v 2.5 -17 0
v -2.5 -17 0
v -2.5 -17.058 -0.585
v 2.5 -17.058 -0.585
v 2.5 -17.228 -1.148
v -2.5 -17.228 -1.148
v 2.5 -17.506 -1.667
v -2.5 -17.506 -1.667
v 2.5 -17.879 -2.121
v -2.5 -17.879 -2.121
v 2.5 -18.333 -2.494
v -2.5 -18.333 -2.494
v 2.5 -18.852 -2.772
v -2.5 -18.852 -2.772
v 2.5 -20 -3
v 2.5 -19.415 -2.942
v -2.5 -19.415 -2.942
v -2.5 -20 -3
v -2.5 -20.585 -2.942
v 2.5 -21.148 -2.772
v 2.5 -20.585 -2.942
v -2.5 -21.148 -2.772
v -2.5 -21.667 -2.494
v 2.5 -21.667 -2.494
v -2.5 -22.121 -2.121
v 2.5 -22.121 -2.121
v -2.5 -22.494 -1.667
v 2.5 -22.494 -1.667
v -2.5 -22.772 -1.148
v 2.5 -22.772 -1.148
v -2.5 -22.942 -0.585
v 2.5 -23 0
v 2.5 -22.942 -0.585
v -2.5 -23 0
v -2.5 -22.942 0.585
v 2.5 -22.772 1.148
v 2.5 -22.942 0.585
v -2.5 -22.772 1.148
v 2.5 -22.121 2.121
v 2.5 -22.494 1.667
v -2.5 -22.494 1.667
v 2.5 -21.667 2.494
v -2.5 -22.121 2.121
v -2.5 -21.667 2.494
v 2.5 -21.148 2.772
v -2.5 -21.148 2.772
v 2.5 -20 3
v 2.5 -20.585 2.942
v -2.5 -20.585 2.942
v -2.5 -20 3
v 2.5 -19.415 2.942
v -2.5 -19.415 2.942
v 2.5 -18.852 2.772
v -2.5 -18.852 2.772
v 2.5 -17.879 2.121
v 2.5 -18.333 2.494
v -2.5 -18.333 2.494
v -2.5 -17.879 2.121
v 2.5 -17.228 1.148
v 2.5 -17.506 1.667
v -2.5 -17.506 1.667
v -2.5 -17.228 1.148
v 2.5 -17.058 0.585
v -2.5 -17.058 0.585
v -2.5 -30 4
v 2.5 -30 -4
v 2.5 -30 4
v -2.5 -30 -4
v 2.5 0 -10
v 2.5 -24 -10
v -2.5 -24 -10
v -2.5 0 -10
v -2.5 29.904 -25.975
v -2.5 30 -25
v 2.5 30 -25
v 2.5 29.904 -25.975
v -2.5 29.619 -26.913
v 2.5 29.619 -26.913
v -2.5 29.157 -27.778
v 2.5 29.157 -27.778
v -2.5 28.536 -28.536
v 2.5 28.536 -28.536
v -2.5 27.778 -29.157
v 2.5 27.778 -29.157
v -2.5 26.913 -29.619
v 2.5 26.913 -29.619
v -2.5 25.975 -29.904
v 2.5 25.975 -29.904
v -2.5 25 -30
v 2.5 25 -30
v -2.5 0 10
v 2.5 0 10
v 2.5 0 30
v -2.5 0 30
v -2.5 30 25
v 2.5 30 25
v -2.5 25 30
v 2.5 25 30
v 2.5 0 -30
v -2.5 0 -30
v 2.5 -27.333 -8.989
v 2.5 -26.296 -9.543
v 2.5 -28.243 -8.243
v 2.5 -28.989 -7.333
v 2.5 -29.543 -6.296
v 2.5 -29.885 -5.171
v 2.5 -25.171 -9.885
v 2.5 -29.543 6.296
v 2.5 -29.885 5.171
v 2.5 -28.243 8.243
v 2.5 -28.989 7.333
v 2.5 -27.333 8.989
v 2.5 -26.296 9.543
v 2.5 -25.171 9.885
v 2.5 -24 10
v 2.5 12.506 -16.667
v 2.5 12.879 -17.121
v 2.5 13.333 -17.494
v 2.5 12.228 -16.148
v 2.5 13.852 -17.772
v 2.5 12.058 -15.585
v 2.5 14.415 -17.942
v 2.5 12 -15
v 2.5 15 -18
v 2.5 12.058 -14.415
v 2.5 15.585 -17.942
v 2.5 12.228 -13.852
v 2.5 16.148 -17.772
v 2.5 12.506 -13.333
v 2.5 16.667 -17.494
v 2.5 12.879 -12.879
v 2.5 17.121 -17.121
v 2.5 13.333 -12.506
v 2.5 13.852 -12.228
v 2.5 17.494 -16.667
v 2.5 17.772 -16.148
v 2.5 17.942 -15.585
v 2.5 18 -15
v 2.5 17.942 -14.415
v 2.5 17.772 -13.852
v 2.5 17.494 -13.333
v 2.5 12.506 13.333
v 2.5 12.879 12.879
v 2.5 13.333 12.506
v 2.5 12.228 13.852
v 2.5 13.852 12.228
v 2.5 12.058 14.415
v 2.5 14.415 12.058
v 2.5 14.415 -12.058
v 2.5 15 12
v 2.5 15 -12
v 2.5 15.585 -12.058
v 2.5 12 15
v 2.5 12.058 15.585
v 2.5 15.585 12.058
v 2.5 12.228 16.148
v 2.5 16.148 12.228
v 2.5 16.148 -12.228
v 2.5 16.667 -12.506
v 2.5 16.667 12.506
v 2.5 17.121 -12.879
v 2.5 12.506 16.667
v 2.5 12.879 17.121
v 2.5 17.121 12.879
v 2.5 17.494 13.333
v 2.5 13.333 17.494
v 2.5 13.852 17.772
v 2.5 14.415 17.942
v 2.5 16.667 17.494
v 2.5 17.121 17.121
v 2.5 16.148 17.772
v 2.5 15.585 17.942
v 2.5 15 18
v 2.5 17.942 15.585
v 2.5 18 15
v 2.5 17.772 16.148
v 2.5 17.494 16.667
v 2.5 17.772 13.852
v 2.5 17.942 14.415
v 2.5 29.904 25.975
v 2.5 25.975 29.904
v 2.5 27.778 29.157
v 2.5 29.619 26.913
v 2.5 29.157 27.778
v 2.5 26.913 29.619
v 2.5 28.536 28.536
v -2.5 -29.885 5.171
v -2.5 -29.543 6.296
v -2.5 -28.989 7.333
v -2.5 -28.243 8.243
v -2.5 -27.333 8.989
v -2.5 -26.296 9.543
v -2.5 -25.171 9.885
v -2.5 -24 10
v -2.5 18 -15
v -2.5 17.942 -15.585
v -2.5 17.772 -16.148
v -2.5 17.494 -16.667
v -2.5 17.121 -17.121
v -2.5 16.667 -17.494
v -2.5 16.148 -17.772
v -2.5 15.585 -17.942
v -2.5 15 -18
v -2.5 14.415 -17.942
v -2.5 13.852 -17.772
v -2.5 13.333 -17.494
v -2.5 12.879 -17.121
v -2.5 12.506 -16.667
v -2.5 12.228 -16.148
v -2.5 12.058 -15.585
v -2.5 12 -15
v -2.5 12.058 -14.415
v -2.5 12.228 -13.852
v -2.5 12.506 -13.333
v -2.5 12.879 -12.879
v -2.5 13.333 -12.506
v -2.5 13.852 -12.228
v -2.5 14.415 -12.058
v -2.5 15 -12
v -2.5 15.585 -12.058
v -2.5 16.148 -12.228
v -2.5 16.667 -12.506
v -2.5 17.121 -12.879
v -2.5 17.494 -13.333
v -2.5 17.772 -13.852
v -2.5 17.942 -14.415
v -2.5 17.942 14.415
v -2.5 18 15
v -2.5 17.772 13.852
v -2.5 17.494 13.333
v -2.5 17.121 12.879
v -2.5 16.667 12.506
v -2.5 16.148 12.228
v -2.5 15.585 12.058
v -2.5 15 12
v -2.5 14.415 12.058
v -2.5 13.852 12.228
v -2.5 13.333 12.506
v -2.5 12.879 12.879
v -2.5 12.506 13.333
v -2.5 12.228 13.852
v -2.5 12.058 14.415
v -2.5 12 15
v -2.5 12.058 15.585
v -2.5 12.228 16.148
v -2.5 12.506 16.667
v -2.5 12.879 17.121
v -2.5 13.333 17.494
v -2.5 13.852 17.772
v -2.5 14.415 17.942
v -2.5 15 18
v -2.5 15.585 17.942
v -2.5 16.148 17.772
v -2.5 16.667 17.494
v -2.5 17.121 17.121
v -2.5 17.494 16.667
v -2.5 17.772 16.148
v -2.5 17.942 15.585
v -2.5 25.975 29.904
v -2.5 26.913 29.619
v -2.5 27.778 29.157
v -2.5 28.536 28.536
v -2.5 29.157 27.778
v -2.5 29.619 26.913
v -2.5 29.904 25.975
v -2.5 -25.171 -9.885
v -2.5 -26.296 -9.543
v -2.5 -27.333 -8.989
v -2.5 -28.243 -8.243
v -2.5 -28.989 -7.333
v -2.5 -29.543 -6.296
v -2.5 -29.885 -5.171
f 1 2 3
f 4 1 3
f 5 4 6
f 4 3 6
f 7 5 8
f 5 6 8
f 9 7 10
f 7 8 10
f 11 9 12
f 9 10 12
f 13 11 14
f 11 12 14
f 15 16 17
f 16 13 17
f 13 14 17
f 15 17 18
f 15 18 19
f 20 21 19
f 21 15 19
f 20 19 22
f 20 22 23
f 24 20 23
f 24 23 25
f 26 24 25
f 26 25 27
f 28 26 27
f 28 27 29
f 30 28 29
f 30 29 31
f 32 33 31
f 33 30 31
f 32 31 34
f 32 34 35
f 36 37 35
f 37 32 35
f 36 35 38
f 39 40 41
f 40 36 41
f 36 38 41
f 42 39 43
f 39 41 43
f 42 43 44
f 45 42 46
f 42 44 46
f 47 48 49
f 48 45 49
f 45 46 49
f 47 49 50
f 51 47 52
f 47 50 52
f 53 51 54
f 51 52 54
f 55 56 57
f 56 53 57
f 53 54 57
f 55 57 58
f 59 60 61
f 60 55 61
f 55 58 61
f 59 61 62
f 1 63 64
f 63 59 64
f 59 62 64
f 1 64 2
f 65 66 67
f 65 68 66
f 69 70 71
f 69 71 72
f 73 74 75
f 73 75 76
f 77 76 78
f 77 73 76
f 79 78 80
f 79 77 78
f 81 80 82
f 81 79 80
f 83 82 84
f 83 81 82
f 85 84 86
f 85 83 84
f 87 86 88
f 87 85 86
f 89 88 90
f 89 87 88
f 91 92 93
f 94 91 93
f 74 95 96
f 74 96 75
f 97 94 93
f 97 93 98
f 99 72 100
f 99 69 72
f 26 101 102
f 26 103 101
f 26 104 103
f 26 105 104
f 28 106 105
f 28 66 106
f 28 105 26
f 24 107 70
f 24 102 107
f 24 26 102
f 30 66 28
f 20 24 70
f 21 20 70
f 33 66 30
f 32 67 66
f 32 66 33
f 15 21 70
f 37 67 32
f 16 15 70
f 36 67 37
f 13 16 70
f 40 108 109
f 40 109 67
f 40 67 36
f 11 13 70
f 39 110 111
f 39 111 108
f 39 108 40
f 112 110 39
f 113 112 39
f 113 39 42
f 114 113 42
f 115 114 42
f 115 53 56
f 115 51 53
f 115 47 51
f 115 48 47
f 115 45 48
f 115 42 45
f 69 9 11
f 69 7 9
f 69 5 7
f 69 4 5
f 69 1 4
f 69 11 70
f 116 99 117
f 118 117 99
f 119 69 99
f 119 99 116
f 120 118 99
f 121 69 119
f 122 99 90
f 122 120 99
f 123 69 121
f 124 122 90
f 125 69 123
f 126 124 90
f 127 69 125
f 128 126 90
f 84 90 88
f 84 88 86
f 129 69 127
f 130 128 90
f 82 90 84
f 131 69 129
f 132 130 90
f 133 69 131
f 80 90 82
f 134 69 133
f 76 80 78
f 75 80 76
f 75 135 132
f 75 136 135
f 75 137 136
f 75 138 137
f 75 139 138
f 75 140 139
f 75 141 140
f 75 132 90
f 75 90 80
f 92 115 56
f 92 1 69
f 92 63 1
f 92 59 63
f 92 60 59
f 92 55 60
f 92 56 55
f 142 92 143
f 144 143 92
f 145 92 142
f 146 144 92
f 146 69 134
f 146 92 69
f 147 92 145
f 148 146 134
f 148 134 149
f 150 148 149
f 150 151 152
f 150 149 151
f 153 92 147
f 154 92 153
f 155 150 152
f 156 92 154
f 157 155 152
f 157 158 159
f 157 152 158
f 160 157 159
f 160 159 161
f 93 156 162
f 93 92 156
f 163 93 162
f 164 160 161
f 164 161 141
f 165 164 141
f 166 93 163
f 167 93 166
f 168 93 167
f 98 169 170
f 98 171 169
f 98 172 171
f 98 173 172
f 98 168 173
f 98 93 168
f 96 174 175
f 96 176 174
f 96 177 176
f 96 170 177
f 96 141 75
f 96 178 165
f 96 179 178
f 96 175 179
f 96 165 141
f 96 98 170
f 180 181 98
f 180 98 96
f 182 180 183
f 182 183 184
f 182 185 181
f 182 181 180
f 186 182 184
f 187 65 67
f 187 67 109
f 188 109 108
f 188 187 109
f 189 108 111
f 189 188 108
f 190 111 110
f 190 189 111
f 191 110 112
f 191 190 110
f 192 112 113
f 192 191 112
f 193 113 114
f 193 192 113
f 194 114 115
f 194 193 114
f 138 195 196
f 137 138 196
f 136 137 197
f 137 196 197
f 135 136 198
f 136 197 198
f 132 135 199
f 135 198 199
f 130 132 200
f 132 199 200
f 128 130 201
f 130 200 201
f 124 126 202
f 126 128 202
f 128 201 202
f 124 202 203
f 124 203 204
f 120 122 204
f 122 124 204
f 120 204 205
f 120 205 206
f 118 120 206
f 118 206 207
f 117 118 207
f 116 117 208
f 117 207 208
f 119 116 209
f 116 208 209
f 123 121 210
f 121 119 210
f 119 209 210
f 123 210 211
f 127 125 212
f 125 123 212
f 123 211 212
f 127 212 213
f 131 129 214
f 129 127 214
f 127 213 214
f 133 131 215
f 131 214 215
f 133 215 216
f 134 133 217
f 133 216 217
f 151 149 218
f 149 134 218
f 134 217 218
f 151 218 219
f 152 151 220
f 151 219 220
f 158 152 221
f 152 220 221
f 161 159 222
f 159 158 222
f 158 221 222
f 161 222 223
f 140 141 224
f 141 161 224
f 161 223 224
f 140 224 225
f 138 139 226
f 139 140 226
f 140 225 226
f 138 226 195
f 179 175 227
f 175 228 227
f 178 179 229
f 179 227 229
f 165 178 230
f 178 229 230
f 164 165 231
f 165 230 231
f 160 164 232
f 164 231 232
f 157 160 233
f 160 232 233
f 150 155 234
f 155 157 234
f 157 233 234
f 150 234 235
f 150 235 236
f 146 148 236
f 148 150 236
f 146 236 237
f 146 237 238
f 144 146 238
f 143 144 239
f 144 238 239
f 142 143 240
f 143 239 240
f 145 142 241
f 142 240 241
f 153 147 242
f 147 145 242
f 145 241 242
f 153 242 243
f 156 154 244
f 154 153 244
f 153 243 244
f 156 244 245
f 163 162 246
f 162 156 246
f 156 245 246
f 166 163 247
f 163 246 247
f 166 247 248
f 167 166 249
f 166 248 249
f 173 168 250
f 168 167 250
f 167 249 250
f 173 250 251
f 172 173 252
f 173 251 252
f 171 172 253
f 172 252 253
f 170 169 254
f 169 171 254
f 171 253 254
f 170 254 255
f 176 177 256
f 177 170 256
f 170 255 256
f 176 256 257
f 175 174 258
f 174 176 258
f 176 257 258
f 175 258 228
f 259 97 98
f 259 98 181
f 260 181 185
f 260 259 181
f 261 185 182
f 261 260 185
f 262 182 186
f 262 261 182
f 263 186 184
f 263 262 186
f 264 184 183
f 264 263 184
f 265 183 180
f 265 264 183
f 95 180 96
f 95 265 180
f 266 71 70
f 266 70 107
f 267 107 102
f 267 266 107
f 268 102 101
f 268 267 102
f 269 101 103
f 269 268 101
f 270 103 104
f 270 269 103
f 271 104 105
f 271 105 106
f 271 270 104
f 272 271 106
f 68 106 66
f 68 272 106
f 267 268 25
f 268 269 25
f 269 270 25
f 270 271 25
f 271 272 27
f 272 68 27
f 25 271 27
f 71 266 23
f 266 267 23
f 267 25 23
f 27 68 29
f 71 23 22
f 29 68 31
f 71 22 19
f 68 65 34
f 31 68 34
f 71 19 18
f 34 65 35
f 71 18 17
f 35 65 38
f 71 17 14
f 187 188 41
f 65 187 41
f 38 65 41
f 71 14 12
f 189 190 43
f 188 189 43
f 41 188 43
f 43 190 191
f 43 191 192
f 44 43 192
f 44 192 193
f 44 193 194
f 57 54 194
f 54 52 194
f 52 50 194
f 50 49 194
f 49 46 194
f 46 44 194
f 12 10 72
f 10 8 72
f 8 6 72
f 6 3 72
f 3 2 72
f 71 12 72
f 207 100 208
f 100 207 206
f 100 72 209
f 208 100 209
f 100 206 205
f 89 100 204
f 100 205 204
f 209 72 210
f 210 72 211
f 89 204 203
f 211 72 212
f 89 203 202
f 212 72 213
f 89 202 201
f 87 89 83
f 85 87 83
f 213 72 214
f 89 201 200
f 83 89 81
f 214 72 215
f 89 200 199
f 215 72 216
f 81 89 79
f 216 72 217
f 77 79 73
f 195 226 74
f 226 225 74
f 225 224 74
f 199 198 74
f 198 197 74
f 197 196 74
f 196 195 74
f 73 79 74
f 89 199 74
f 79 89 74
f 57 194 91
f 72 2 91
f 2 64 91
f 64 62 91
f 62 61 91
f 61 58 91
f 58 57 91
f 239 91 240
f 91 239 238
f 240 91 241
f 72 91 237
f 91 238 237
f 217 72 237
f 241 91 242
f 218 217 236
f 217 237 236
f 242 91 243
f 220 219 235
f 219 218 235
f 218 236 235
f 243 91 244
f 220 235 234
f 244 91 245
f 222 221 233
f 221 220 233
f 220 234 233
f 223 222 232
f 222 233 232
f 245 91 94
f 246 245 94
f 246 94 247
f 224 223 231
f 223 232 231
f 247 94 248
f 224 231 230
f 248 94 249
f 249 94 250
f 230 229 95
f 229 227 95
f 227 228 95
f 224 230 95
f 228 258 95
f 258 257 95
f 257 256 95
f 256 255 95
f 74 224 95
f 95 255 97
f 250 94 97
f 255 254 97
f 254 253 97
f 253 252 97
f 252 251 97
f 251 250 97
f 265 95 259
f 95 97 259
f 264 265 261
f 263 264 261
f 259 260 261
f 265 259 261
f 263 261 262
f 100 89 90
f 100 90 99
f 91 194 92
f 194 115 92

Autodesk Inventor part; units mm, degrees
ref_plane "YZ Plane" through (0, 0, 0) normal (1, 0, 0) x (0, 1, 0)
ref_plane "XZ Plane" through (0, 0, 0) normal (0, 1, 0) x (-1, 0, 0)
ref_plane "XY Plane" through (0, 0, 0) normal (0, 0, 1) x (1, 0, 0)
sketch "Sketch1" plane through (0, 0, 0) normal (1, 0, 0) x (0, 1, 0)
  line L0 (-25, 30) -> (25, 30)
  line L1 (30, 25) -> (30, -25)
  line L2 (25, -30) -> (-25, -30)
  line L3 (-30, -25) -> (-30, 25)
  line L4 (-30, 30) -> (30, -30) construction
  line L5 (30, 30) -> (-30, -30) construction
  arc A0 (-25, 30) -> (-30, 25) centre (-25, 25) ccw
  arc A1 (-30, -25) -> (-25, -30) centre (-25, -25) ccw
  arc A2 (25, -30) -> (30, -25) centre (25, -25) ccw
  arc A3 (30, 25) -> (25, 30) centre (25, 25) ccw
  circle A4 centre (-20, 0) radius 3
  circle A5 centre (15, 15) radius 3
  circle A6 centre (15, -15) radius 3
  point P0 (0, 0)
  dimension "d0" = 60
  dimension "d1" = 60
  dimension "d6" = 5
  dimension "d7" = 6
  dimension "d10" = 15
  dimension "d11" = 30
  dimension "d12" = 15
  dimension "d13" = 6
  dimension "d14" = 35
extrude "Plate1" add sketch "Sketch1" along normal mid plane 5
sketch "Sketch2" plane through (2.5, 0, 0) normal (1, 0, 0) x (0, 0, -1)
  line L0 (-30, -30) -> (-10, -30)
  line L1 (-10, -30) -> (-10, 0)
  line L2 (-10, 0) -> (-30, 0)
  line L3 (-30, 0) -> (-30, -30)
  line L4 (30, -30) -> (10, -30)
  line L5 (10, -30) -> (10, 0)
  line L6 (10, 0) -> (30, 0)
  line L7 (30, 0) -> (30, -30)
  circle A0 centre (-15, 15) radius 3 projected
  circle A1 centre (0, -20) radius 3 projected
  line L8 (-30, -25) -> (-30, 25) construction
  point P0 (0, 0)
  dimension "d15" = 15
  dimension "d17" = 10
  dimension "d18" = 10
  dimension "d19" = 30
extrude "Cut1" cut sketch "Sketch2" against normal blind 5 contours L3 L2 L1 L0 | L4 L5 L6 L7
fillet "Corner Round1" radius 6 2 edges at (0, -30, 10) (0, -30, -10)
equation "\"d20\" = Thickness"
equation "\"d9\" = Thickness"
equation "\"BendRadius\" = Thickness"
equation "\"BendReliefWidth\" = Thickness"
equation "\"BendReliefDepth\" = 0.5 * Thickness"
equation "\"TransitionRadius\" = BendRadius"
equation "\"JacobiRadiusSize\" = BendRadius"
equation "\"GapSize\" = Thickness"
equation "\"Thickness\" = 5"
properties part number "HCMUTE-CDT23-BAT_CANG_BANG_TAI" material "Stainless Steel"
